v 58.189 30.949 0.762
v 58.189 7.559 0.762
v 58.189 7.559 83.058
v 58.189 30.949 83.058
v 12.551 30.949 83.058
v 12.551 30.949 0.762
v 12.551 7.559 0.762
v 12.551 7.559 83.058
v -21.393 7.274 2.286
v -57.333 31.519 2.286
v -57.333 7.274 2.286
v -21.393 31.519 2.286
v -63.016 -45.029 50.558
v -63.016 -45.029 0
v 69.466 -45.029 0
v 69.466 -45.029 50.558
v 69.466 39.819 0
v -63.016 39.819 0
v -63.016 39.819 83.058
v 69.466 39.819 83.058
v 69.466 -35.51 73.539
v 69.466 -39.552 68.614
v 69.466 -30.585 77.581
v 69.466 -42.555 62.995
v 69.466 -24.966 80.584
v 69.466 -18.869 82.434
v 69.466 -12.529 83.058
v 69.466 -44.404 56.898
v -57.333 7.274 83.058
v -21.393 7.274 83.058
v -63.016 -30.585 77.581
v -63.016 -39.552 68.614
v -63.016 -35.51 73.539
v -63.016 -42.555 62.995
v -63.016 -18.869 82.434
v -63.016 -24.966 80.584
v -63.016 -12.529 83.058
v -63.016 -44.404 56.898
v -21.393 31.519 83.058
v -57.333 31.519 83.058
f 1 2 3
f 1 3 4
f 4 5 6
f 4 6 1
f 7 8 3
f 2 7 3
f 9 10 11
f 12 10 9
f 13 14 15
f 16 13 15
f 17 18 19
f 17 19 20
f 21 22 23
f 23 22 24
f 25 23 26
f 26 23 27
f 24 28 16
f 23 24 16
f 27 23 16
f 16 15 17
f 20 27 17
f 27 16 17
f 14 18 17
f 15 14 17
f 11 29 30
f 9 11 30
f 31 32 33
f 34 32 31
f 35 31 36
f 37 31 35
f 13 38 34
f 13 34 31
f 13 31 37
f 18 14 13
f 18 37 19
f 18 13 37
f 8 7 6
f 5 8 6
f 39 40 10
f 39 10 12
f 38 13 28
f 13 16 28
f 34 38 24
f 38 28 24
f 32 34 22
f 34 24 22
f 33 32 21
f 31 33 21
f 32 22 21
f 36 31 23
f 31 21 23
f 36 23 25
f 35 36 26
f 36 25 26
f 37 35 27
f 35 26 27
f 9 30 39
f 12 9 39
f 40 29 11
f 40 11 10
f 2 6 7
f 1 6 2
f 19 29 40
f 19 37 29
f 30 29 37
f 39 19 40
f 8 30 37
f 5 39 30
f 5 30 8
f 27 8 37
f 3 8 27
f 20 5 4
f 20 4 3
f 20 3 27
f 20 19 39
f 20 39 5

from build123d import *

# Parameters (mm, degrees)
F0_W     = 132.481672
F0_H     = 84.847815
F1_DEPTH = 83.058
F2_W     = 35.940319
F2_H     = 24.245456
F4_DEPTH = 80.772
F3_W     = 45.638506
F3_H     = 23.389732
F5_DEPTH = 82.296
F6_R     = 32.500143


with BuildPart() as f1:
    # F0 (on Top) → F1 (new body)
    with BuildSketch(Plane.XY):
        with Locations((3.225211, -2.604976)):
            Rectangle(F0_W, F0_H)
    extrude(amount=F1_DEPTH)

    # F2 (on face) → F4 (cut)
    with BuildSketch(Plane.XY.offset(83.058)):
        with Locations((-39.363209, 19.396365)):
            Rectangle(F2_W, F2_H)
    extrude(amount=-F4_DEPTH, mode=Mode.SUBTRACT)

    # F3 (on face) → F5 (cut)
    with BuildSketch(Plane.XY.offset(83.058)):
        with Locations((35.369841, 19.253743)):
            Rectangle(F3_W, F3_H)
    extrude(amount=-F5_DEPTH, mode=Mode.SUBTRACT)

    # F6
    f6_edges = [f1.edges().sort_by_distance(p)[0] for p in [
        (3.225211, -45.028884, 83.058),
    ]]
    fillet(f6_edges, radius=F6_R)


solid = f1.part
